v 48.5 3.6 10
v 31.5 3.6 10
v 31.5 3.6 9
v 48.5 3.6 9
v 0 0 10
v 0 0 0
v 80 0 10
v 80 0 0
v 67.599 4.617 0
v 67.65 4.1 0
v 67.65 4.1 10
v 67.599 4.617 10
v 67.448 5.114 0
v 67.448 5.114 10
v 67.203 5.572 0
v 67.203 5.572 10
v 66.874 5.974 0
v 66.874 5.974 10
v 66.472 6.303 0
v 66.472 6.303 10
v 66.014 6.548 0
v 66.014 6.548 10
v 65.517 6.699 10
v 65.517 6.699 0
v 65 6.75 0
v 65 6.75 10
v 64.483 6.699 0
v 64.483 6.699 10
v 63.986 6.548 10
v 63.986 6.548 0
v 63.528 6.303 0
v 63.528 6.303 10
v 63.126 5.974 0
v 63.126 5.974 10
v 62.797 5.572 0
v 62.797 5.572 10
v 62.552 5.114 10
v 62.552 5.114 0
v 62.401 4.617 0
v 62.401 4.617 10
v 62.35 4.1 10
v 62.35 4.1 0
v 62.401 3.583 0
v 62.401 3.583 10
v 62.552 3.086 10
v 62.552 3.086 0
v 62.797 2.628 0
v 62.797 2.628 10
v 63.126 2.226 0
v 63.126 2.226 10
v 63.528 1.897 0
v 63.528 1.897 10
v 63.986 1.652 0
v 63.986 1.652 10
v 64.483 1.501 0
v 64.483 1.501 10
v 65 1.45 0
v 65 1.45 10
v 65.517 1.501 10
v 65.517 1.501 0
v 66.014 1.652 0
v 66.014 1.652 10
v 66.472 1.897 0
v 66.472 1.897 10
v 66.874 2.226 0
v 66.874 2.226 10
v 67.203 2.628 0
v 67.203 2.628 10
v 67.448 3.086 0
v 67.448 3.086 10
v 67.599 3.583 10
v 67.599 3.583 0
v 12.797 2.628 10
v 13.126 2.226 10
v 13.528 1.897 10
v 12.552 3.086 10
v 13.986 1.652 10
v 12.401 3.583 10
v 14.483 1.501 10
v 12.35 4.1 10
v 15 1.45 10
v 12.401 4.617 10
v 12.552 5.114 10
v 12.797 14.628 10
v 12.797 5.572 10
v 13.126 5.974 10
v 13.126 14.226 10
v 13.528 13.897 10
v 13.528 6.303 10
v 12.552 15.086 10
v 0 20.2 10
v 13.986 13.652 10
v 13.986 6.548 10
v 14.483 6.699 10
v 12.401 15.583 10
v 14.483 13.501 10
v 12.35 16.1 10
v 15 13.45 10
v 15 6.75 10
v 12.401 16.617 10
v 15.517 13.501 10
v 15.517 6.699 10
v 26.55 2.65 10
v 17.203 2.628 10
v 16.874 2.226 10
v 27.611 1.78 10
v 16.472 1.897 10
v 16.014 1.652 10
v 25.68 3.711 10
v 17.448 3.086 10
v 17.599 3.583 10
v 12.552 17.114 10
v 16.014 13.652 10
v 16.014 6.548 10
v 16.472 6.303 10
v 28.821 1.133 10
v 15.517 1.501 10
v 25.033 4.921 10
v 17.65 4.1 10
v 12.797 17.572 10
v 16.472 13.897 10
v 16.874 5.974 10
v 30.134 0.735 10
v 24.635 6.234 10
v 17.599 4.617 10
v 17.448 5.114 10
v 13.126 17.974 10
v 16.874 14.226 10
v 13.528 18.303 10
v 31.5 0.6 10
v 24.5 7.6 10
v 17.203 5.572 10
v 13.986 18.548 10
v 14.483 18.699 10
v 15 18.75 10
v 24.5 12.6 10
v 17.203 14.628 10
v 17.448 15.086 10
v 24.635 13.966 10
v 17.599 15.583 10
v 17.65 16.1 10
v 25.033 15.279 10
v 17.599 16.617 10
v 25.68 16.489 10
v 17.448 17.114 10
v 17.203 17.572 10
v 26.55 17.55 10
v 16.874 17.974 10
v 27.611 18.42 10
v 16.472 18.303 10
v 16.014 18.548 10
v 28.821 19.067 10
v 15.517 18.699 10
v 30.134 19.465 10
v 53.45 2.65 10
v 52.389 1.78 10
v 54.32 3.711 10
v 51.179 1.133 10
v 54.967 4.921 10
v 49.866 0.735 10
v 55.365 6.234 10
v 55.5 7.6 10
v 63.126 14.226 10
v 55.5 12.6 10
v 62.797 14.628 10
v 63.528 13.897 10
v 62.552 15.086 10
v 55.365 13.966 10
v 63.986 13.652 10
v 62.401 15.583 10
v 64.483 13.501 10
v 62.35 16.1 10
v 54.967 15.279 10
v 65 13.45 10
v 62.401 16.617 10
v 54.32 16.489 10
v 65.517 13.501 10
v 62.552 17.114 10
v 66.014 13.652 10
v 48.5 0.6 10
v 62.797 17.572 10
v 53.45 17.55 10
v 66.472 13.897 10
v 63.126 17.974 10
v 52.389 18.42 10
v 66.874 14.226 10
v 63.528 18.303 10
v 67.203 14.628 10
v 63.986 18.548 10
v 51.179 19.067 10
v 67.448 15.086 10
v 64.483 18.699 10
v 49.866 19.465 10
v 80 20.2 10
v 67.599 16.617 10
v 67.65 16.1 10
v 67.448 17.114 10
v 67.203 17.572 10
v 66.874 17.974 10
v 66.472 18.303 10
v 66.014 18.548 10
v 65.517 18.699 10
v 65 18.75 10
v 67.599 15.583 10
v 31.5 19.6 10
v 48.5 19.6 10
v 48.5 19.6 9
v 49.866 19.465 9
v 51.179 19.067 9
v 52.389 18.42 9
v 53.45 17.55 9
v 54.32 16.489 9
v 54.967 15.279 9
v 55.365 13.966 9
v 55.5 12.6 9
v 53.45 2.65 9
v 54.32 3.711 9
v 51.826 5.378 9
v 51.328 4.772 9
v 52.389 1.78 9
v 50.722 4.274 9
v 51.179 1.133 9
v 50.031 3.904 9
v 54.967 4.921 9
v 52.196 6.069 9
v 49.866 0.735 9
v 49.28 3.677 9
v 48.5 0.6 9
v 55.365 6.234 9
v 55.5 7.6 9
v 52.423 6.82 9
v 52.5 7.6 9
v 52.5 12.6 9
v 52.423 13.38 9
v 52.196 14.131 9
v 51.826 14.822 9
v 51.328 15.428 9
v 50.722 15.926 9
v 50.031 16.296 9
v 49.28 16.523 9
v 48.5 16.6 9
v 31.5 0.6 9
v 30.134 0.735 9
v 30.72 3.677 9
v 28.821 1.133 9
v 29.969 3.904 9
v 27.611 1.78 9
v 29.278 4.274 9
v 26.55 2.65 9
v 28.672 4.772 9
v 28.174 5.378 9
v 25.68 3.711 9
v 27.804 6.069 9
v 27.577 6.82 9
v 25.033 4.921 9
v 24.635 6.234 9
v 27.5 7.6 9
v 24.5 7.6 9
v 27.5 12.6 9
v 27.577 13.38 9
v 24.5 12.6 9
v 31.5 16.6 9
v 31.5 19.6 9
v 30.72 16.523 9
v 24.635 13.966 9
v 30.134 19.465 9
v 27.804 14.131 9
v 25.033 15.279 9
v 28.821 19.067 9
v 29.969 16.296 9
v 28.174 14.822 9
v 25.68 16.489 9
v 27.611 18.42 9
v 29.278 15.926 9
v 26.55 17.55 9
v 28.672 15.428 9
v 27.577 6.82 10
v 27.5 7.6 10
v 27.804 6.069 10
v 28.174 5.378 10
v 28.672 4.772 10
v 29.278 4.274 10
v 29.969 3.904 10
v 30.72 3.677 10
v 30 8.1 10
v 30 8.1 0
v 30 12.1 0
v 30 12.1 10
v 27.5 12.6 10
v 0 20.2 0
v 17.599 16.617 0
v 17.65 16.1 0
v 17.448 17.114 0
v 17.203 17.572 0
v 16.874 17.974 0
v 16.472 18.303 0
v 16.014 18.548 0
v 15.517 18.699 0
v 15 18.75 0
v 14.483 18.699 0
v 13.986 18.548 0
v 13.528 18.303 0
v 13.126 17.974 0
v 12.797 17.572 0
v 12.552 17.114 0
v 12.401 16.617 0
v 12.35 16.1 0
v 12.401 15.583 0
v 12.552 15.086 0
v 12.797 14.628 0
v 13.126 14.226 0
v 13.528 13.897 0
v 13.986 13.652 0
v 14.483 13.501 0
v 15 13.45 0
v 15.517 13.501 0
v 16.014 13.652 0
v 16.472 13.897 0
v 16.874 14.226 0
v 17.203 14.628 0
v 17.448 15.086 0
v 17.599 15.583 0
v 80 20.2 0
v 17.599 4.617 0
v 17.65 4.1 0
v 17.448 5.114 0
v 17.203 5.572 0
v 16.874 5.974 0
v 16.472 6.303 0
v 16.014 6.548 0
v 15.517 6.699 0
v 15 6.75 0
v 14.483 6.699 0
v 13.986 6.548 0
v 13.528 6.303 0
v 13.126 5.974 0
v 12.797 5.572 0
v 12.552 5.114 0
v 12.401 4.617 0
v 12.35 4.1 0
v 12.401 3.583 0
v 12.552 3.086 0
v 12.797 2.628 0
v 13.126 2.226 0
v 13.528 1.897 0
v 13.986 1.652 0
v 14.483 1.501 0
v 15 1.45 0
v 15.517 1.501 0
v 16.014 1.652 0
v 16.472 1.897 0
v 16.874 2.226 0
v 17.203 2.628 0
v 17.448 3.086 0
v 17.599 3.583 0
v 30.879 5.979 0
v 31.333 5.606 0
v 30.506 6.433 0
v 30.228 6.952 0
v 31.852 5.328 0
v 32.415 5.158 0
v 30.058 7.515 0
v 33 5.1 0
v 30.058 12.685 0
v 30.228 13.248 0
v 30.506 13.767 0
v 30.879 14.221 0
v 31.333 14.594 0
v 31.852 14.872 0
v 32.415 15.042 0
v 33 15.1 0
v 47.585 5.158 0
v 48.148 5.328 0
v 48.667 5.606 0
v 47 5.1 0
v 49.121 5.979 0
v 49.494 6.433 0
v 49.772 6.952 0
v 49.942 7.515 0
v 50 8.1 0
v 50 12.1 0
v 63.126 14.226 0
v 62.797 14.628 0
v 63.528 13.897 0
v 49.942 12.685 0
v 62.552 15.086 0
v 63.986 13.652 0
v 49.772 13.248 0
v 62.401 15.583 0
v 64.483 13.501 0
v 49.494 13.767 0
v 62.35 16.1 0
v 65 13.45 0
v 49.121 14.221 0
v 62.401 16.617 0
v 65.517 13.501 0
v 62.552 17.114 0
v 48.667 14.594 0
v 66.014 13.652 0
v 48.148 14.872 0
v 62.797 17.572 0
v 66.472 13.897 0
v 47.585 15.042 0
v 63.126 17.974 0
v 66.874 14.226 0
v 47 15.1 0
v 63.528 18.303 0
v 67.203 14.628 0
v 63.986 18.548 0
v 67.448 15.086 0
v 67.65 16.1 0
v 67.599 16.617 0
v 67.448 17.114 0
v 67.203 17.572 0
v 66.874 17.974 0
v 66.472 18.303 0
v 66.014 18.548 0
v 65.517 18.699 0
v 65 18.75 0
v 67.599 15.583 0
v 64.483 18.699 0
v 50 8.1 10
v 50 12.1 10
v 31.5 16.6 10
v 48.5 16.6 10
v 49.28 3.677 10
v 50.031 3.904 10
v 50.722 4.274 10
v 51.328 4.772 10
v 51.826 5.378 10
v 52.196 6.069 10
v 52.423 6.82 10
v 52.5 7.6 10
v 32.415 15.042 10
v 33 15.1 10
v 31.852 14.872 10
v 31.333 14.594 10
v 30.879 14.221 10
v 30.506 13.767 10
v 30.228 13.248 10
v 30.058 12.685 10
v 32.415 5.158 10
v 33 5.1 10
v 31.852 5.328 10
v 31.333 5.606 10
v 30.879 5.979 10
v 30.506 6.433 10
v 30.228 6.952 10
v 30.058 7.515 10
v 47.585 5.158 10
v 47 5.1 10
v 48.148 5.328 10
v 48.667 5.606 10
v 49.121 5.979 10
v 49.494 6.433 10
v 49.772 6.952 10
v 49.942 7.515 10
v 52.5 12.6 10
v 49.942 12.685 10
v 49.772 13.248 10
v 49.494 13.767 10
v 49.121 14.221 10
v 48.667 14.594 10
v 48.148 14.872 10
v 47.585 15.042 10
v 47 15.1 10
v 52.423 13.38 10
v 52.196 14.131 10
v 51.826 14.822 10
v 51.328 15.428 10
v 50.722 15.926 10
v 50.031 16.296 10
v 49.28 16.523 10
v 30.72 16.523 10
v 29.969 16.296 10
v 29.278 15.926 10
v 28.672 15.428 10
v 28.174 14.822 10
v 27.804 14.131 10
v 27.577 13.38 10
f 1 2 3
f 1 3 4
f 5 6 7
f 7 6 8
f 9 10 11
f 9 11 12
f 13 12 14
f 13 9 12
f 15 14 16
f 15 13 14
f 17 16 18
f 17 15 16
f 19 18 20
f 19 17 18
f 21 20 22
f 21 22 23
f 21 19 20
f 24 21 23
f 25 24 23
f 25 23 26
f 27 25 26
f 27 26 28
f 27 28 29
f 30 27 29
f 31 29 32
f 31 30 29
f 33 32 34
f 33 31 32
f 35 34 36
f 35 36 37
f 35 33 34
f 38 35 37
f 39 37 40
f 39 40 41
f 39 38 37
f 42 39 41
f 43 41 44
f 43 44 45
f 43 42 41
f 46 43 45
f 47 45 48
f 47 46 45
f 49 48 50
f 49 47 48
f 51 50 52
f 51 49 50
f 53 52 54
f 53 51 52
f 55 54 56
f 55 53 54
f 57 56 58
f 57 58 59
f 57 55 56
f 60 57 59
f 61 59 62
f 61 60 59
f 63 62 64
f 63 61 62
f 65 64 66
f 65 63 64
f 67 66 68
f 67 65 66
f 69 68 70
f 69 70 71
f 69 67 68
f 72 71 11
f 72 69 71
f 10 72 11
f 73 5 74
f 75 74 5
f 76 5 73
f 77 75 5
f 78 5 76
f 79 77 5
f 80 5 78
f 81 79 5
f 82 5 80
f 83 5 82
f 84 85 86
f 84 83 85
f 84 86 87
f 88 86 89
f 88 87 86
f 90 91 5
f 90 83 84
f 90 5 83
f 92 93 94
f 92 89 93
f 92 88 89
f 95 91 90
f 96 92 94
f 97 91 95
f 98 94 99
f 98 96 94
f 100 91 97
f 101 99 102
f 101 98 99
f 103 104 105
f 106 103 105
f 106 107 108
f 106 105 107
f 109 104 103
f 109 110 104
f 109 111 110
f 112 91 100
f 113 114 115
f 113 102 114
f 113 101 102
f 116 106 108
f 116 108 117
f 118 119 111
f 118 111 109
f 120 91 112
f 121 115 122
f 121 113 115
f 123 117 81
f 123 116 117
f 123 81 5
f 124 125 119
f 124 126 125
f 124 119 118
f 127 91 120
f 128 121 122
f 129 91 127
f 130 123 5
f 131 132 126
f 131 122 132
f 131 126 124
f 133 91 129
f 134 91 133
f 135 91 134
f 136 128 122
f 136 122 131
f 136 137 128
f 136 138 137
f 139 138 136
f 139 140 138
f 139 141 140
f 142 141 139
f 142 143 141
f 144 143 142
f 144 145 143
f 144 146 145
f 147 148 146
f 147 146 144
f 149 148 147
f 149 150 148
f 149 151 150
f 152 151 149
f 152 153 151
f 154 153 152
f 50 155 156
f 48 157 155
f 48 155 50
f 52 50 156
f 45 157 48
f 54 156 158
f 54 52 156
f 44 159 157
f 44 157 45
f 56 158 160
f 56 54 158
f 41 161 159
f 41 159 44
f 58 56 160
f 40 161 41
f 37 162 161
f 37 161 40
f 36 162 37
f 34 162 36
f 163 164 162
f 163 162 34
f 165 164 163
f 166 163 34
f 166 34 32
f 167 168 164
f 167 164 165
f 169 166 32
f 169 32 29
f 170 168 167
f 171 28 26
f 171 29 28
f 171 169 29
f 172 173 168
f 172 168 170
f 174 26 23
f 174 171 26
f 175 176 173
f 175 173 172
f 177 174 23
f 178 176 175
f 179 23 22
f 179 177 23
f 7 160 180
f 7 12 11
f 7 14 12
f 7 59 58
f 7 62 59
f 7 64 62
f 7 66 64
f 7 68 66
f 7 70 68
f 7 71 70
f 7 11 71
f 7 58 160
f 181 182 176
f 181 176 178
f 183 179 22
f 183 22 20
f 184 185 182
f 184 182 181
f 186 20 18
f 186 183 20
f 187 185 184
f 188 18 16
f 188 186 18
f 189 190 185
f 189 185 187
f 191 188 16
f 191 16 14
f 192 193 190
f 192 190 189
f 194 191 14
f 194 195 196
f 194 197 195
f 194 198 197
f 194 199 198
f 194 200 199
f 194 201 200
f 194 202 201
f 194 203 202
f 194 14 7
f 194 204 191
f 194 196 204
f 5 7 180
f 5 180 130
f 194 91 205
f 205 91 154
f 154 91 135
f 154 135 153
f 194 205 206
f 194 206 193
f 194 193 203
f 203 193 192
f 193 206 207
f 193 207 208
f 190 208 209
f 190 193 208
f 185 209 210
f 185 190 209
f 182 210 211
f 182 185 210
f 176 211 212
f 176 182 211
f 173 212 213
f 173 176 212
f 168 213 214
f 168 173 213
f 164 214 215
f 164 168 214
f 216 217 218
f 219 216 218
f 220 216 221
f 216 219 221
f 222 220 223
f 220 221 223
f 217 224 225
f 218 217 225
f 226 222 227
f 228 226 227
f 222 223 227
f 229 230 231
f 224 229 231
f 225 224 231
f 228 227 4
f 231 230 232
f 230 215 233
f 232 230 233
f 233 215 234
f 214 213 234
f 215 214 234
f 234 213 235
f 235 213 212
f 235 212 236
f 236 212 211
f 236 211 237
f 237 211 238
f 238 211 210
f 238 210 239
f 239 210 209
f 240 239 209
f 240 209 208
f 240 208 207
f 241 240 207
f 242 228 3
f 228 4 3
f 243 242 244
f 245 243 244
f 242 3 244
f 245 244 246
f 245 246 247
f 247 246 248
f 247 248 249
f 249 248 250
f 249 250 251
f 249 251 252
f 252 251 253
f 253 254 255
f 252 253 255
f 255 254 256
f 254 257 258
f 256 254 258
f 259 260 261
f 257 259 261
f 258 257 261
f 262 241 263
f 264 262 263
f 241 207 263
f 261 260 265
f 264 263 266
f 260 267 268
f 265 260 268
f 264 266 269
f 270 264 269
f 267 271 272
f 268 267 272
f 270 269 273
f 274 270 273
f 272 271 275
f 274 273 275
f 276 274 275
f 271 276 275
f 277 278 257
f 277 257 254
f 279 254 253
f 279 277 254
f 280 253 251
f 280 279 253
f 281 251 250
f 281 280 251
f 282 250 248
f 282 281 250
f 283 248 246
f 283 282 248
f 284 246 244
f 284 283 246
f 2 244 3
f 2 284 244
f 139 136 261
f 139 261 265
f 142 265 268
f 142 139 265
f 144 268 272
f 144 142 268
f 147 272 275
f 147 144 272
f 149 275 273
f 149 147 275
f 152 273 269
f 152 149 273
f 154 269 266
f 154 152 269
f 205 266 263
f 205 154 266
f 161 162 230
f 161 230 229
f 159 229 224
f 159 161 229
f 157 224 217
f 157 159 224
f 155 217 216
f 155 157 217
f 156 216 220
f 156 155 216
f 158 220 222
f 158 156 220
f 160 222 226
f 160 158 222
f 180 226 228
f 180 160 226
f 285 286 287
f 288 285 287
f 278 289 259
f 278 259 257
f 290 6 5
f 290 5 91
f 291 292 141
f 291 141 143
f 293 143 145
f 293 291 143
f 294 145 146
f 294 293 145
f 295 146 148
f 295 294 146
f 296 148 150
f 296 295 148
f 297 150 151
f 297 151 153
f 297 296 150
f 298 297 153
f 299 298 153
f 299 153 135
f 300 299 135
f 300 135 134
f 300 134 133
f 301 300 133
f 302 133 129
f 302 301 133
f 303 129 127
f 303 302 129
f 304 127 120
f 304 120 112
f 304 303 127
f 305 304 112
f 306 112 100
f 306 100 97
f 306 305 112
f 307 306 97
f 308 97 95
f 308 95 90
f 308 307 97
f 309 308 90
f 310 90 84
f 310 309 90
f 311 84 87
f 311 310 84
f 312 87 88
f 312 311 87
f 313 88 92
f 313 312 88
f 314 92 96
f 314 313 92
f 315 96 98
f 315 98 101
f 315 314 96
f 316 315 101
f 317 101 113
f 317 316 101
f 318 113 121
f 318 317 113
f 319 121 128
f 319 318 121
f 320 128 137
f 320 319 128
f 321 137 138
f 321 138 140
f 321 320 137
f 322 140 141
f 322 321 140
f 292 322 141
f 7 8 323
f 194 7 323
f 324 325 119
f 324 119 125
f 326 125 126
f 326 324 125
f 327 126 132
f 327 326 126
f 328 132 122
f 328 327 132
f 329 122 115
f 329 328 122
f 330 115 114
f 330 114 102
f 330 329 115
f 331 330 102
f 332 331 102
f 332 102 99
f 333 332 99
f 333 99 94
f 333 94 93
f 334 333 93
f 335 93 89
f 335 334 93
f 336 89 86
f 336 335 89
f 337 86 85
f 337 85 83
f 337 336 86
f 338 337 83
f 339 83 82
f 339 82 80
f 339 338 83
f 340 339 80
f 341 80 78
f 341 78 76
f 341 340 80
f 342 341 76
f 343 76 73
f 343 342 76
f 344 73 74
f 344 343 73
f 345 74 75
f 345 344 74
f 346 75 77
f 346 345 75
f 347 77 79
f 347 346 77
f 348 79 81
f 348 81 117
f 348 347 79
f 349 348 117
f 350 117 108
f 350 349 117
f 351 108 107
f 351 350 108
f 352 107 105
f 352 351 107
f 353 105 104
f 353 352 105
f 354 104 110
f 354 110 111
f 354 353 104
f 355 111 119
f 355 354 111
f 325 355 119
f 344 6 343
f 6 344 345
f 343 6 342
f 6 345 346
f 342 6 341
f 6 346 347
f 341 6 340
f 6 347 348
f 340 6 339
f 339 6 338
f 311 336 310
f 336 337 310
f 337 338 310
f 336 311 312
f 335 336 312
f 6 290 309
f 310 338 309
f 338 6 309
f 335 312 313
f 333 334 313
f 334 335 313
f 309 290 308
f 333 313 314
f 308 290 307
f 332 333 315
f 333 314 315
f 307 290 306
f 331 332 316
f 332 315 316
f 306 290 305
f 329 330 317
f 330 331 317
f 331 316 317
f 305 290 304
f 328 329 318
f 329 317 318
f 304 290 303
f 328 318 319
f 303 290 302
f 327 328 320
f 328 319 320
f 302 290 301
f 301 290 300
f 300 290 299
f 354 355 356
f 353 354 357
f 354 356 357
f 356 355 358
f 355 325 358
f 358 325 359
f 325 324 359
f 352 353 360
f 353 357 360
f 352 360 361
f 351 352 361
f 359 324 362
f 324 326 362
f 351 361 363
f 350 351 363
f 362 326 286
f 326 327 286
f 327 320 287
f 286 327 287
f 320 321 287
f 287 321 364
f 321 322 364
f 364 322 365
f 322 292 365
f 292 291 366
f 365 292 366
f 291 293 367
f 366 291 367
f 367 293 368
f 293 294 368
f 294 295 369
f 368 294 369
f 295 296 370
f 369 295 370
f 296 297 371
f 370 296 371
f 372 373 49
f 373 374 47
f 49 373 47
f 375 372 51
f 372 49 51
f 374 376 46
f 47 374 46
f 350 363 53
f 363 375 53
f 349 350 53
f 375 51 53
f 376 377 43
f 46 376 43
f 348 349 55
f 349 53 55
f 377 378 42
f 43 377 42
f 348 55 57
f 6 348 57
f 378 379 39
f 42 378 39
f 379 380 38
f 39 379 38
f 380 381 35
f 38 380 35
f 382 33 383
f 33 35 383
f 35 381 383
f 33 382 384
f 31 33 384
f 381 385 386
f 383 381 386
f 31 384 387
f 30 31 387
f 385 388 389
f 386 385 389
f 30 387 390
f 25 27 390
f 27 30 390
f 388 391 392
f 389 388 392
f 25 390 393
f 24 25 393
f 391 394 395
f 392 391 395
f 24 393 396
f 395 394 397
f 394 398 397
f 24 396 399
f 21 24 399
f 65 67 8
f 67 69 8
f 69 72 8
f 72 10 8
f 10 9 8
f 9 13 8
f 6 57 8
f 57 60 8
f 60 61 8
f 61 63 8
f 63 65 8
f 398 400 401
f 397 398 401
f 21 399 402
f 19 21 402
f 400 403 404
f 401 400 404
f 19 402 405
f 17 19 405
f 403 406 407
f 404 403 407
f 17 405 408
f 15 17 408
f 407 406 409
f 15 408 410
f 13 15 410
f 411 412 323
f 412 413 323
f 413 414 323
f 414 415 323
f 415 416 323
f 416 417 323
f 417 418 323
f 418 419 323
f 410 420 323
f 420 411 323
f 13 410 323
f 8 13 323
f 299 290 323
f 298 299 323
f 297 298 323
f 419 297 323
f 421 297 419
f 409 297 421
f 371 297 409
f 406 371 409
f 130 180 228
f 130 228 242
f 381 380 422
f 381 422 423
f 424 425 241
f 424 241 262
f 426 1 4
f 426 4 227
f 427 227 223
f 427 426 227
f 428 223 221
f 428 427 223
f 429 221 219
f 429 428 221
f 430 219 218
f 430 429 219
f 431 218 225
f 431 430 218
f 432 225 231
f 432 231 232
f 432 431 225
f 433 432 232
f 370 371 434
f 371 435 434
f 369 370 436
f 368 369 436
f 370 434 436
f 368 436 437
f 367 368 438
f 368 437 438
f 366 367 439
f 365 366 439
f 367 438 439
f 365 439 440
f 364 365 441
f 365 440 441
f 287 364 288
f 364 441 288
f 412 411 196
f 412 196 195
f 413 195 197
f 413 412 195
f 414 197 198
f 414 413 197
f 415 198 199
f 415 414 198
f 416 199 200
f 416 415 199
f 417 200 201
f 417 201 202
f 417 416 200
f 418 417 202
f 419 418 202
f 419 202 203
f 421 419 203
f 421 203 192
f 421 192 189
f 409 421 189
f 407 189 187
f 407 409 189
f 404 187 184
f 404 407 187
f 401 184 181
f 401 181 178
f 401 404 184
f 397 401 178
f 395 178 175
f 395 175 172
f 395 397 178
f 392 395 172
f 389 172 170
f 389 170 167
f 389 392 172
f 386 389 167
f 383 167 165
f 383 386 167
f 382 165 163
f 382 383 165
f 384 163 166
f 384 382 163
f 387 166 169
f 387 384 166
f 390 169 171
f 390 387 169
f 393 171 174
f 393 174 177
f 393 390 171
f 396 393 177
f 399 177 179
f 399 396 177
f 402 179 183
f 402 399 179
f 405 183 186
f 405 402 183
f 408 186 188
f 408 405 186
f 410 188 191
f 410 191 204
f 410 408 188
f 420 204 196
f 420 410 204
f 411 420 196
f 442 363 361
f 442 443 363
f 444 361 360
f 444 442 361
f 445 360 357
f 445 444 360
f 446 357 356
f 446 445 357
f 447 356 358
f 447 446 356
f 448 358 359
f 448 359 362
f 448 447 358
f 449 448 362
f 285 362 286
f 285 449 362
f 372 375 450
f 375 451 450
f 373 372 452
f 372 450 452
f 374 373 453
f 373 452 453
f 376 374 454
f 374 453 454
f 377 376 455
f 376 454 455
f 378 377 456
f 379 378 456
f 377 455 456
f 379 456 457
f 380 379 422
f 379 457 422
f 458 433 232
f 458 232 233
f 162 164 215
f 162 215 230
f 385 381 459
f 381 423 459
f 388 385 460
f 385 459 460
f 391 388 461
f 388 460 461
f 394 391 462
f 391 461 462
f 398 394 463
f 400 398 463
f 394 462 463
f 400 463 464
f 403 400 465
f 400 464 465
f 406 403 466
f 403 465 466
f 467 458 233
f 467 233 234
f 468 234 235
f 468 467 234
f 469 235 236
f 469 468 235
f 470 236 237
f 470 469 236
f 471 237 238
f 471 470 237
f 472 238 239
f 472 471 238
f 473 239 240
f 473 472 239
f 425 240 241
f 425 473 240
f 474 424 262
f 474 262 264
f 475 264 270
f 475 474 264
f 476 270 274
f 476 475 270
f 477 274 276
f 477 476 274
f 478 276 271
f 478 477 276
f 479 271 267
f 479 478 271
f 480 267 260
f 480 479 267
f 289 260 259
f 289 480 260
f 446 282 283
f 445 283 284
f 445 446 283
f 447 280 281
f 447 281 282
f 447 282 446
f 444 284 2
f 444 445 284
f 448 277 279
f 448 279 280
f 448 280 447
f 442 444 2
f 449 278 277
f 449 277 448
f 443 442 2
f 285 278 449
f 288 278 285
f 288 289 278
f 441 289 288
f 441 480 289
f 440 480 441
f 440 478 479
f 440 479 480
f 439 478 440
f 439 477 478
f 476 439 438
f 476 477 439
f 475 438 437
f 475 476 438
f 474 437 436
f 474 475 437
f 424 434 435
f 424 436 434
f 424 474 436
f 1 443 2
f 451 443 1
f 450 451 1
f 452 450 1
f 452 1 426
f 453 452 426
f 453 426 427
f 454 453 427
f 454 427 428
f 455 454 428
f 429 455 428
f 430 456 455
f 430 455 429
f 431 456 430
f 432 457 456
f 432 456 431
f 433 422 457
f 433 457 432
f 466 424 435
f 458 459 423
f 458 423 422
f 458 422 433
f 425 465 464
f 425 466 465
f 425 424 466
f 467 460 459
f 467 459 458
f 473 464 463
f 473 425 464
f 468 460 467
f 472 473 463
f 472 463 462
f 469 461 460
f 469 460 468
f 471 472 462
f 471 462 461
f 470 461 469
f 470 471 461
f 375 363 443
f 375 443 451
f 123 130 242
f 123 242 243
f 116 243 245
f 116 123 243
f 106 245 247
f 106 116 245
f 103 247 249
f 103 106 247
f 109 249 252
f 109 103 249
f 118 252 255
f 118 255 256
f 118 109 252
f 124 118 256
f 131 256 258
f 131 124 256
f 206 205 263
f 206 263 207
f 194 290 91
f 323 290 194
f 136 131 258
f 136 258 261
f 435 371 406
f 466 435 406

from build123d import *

# Parameters (mm, degrees)
SKIZZE1_W                       = 80
SKIZZE1_H                       = 20.2
SKIZZE1_R                       = 2.65
SKIZZE1_W_2                     = 20
SKIZZE1_H_2                     = 10
AUFSATZ_LINEAR_AUSTRAGEN1_DEPTH = 10
VERRUNDUNG1_R                   = 3
SCHNITT_LINEAR_AUSTRAGEN1_DEPTH = 1


with BuildPart() as part:
    # Skizze1 → Aufsatz-Linear austragen1 (new body)
    with BuildSketch(Plane.XY):
        with Locations((40, 10.1)):
            Rectangle(SKIZZE1_W, SKIZZE1_H)
        with Locations((15, 16.1)):
            Circle(SKIZZE1_R, mode=Mode.SUBTRACT)
        with Locations((15, 4.1)):
            Circle(SKIZZE1_R, mode=Mode.SUBTRACT)
        with Locations((65, 16.1)):
            Circle(SKIZZE1_R, mode=Mode.SUBTRACT)
        with Locations((65, 4.1)):
            Circle(SKIZZE1_R, mode=Mode.SUBTRACT)
        with Locations((40, 10.1)):
            Rectangle(SKIZZE1_W_2, SKIZZE1_H_2, mode=Mode.SUBTRACT)
    extrude(amount=AUFSATZ_LINEAR_AUSTRAGEN1_DEPTH)

    # Verrundung1
    verrundung1_edges = [part.edges().sort_by_distance(p)[0] for p in [
        (50, 5.1, 5),
        (50, 15.1, 5),
        (30, 15.1, 5),
        (30, 5.1, 5),
    ]]
    fillet(verrundung1_edges, radius=VERRUNDUNG1_R)

    # Skizze2 → Schnitt-Linear austragen1 (cut)
    with BuildSketch(Plane.XY.offset(10)):
        with BuildLine():
            Line((55.5, 12.6), (55.5, 7.6))
            ThreePointArc((55.5, 7.6), (53.449747468, 2.650252532), (48.5, 0.6))
            Line((48.5, 0.6), (31.5, 0.6))
            ThreePointArc((31.5, 0.6), (26.550252532, 2.650252532), (24.5, 7.6))
            Line((24.5, 7.6), (24.5, 12.6))
            ThreePointArc((24.5, 12.6), (26.550252532, 17.549747468), (31.5, 19.6))
            Line((31.5, 19.6), (48.5, 19.6))
            ThreePointArc((48.5, 19.6), (53.449747468, 17.549747468), (55.5, 12.6))
        make_face()
        with BuildLine():
            Line((48.5, 16.6), (31.5, 16.6))
            ThreePointArc((31.5, 16.6), (28.671572875, 15.428427125), (27.5, 12.6))
            Line((27.5, 12.6), (27.5, 7.6))
            ThreePointArc((27.5, 7.6), (28.671572875, 4.771572875), (31.5, 3.6))
            Line((31.5, 3.6), (48.5, 3.6))
            ThreePointArc((48.5, 3.6), (51.328427125, 4.771572875), (52.5, 7.6))
            Line((52.5, 7.6), (52.5, 12.6))
            ThreePointArc((52.5, 12.6), (51.328427125, 15.428427125), (48.5, 16.6))
        make_face(mode=Mode.SUBTRACT)
    extrude(amount=-SCHNITT_LINEAR_AUSTRAGEN1_DEPTH, mode=Mode.SUBTRACT)


solid = part.part
